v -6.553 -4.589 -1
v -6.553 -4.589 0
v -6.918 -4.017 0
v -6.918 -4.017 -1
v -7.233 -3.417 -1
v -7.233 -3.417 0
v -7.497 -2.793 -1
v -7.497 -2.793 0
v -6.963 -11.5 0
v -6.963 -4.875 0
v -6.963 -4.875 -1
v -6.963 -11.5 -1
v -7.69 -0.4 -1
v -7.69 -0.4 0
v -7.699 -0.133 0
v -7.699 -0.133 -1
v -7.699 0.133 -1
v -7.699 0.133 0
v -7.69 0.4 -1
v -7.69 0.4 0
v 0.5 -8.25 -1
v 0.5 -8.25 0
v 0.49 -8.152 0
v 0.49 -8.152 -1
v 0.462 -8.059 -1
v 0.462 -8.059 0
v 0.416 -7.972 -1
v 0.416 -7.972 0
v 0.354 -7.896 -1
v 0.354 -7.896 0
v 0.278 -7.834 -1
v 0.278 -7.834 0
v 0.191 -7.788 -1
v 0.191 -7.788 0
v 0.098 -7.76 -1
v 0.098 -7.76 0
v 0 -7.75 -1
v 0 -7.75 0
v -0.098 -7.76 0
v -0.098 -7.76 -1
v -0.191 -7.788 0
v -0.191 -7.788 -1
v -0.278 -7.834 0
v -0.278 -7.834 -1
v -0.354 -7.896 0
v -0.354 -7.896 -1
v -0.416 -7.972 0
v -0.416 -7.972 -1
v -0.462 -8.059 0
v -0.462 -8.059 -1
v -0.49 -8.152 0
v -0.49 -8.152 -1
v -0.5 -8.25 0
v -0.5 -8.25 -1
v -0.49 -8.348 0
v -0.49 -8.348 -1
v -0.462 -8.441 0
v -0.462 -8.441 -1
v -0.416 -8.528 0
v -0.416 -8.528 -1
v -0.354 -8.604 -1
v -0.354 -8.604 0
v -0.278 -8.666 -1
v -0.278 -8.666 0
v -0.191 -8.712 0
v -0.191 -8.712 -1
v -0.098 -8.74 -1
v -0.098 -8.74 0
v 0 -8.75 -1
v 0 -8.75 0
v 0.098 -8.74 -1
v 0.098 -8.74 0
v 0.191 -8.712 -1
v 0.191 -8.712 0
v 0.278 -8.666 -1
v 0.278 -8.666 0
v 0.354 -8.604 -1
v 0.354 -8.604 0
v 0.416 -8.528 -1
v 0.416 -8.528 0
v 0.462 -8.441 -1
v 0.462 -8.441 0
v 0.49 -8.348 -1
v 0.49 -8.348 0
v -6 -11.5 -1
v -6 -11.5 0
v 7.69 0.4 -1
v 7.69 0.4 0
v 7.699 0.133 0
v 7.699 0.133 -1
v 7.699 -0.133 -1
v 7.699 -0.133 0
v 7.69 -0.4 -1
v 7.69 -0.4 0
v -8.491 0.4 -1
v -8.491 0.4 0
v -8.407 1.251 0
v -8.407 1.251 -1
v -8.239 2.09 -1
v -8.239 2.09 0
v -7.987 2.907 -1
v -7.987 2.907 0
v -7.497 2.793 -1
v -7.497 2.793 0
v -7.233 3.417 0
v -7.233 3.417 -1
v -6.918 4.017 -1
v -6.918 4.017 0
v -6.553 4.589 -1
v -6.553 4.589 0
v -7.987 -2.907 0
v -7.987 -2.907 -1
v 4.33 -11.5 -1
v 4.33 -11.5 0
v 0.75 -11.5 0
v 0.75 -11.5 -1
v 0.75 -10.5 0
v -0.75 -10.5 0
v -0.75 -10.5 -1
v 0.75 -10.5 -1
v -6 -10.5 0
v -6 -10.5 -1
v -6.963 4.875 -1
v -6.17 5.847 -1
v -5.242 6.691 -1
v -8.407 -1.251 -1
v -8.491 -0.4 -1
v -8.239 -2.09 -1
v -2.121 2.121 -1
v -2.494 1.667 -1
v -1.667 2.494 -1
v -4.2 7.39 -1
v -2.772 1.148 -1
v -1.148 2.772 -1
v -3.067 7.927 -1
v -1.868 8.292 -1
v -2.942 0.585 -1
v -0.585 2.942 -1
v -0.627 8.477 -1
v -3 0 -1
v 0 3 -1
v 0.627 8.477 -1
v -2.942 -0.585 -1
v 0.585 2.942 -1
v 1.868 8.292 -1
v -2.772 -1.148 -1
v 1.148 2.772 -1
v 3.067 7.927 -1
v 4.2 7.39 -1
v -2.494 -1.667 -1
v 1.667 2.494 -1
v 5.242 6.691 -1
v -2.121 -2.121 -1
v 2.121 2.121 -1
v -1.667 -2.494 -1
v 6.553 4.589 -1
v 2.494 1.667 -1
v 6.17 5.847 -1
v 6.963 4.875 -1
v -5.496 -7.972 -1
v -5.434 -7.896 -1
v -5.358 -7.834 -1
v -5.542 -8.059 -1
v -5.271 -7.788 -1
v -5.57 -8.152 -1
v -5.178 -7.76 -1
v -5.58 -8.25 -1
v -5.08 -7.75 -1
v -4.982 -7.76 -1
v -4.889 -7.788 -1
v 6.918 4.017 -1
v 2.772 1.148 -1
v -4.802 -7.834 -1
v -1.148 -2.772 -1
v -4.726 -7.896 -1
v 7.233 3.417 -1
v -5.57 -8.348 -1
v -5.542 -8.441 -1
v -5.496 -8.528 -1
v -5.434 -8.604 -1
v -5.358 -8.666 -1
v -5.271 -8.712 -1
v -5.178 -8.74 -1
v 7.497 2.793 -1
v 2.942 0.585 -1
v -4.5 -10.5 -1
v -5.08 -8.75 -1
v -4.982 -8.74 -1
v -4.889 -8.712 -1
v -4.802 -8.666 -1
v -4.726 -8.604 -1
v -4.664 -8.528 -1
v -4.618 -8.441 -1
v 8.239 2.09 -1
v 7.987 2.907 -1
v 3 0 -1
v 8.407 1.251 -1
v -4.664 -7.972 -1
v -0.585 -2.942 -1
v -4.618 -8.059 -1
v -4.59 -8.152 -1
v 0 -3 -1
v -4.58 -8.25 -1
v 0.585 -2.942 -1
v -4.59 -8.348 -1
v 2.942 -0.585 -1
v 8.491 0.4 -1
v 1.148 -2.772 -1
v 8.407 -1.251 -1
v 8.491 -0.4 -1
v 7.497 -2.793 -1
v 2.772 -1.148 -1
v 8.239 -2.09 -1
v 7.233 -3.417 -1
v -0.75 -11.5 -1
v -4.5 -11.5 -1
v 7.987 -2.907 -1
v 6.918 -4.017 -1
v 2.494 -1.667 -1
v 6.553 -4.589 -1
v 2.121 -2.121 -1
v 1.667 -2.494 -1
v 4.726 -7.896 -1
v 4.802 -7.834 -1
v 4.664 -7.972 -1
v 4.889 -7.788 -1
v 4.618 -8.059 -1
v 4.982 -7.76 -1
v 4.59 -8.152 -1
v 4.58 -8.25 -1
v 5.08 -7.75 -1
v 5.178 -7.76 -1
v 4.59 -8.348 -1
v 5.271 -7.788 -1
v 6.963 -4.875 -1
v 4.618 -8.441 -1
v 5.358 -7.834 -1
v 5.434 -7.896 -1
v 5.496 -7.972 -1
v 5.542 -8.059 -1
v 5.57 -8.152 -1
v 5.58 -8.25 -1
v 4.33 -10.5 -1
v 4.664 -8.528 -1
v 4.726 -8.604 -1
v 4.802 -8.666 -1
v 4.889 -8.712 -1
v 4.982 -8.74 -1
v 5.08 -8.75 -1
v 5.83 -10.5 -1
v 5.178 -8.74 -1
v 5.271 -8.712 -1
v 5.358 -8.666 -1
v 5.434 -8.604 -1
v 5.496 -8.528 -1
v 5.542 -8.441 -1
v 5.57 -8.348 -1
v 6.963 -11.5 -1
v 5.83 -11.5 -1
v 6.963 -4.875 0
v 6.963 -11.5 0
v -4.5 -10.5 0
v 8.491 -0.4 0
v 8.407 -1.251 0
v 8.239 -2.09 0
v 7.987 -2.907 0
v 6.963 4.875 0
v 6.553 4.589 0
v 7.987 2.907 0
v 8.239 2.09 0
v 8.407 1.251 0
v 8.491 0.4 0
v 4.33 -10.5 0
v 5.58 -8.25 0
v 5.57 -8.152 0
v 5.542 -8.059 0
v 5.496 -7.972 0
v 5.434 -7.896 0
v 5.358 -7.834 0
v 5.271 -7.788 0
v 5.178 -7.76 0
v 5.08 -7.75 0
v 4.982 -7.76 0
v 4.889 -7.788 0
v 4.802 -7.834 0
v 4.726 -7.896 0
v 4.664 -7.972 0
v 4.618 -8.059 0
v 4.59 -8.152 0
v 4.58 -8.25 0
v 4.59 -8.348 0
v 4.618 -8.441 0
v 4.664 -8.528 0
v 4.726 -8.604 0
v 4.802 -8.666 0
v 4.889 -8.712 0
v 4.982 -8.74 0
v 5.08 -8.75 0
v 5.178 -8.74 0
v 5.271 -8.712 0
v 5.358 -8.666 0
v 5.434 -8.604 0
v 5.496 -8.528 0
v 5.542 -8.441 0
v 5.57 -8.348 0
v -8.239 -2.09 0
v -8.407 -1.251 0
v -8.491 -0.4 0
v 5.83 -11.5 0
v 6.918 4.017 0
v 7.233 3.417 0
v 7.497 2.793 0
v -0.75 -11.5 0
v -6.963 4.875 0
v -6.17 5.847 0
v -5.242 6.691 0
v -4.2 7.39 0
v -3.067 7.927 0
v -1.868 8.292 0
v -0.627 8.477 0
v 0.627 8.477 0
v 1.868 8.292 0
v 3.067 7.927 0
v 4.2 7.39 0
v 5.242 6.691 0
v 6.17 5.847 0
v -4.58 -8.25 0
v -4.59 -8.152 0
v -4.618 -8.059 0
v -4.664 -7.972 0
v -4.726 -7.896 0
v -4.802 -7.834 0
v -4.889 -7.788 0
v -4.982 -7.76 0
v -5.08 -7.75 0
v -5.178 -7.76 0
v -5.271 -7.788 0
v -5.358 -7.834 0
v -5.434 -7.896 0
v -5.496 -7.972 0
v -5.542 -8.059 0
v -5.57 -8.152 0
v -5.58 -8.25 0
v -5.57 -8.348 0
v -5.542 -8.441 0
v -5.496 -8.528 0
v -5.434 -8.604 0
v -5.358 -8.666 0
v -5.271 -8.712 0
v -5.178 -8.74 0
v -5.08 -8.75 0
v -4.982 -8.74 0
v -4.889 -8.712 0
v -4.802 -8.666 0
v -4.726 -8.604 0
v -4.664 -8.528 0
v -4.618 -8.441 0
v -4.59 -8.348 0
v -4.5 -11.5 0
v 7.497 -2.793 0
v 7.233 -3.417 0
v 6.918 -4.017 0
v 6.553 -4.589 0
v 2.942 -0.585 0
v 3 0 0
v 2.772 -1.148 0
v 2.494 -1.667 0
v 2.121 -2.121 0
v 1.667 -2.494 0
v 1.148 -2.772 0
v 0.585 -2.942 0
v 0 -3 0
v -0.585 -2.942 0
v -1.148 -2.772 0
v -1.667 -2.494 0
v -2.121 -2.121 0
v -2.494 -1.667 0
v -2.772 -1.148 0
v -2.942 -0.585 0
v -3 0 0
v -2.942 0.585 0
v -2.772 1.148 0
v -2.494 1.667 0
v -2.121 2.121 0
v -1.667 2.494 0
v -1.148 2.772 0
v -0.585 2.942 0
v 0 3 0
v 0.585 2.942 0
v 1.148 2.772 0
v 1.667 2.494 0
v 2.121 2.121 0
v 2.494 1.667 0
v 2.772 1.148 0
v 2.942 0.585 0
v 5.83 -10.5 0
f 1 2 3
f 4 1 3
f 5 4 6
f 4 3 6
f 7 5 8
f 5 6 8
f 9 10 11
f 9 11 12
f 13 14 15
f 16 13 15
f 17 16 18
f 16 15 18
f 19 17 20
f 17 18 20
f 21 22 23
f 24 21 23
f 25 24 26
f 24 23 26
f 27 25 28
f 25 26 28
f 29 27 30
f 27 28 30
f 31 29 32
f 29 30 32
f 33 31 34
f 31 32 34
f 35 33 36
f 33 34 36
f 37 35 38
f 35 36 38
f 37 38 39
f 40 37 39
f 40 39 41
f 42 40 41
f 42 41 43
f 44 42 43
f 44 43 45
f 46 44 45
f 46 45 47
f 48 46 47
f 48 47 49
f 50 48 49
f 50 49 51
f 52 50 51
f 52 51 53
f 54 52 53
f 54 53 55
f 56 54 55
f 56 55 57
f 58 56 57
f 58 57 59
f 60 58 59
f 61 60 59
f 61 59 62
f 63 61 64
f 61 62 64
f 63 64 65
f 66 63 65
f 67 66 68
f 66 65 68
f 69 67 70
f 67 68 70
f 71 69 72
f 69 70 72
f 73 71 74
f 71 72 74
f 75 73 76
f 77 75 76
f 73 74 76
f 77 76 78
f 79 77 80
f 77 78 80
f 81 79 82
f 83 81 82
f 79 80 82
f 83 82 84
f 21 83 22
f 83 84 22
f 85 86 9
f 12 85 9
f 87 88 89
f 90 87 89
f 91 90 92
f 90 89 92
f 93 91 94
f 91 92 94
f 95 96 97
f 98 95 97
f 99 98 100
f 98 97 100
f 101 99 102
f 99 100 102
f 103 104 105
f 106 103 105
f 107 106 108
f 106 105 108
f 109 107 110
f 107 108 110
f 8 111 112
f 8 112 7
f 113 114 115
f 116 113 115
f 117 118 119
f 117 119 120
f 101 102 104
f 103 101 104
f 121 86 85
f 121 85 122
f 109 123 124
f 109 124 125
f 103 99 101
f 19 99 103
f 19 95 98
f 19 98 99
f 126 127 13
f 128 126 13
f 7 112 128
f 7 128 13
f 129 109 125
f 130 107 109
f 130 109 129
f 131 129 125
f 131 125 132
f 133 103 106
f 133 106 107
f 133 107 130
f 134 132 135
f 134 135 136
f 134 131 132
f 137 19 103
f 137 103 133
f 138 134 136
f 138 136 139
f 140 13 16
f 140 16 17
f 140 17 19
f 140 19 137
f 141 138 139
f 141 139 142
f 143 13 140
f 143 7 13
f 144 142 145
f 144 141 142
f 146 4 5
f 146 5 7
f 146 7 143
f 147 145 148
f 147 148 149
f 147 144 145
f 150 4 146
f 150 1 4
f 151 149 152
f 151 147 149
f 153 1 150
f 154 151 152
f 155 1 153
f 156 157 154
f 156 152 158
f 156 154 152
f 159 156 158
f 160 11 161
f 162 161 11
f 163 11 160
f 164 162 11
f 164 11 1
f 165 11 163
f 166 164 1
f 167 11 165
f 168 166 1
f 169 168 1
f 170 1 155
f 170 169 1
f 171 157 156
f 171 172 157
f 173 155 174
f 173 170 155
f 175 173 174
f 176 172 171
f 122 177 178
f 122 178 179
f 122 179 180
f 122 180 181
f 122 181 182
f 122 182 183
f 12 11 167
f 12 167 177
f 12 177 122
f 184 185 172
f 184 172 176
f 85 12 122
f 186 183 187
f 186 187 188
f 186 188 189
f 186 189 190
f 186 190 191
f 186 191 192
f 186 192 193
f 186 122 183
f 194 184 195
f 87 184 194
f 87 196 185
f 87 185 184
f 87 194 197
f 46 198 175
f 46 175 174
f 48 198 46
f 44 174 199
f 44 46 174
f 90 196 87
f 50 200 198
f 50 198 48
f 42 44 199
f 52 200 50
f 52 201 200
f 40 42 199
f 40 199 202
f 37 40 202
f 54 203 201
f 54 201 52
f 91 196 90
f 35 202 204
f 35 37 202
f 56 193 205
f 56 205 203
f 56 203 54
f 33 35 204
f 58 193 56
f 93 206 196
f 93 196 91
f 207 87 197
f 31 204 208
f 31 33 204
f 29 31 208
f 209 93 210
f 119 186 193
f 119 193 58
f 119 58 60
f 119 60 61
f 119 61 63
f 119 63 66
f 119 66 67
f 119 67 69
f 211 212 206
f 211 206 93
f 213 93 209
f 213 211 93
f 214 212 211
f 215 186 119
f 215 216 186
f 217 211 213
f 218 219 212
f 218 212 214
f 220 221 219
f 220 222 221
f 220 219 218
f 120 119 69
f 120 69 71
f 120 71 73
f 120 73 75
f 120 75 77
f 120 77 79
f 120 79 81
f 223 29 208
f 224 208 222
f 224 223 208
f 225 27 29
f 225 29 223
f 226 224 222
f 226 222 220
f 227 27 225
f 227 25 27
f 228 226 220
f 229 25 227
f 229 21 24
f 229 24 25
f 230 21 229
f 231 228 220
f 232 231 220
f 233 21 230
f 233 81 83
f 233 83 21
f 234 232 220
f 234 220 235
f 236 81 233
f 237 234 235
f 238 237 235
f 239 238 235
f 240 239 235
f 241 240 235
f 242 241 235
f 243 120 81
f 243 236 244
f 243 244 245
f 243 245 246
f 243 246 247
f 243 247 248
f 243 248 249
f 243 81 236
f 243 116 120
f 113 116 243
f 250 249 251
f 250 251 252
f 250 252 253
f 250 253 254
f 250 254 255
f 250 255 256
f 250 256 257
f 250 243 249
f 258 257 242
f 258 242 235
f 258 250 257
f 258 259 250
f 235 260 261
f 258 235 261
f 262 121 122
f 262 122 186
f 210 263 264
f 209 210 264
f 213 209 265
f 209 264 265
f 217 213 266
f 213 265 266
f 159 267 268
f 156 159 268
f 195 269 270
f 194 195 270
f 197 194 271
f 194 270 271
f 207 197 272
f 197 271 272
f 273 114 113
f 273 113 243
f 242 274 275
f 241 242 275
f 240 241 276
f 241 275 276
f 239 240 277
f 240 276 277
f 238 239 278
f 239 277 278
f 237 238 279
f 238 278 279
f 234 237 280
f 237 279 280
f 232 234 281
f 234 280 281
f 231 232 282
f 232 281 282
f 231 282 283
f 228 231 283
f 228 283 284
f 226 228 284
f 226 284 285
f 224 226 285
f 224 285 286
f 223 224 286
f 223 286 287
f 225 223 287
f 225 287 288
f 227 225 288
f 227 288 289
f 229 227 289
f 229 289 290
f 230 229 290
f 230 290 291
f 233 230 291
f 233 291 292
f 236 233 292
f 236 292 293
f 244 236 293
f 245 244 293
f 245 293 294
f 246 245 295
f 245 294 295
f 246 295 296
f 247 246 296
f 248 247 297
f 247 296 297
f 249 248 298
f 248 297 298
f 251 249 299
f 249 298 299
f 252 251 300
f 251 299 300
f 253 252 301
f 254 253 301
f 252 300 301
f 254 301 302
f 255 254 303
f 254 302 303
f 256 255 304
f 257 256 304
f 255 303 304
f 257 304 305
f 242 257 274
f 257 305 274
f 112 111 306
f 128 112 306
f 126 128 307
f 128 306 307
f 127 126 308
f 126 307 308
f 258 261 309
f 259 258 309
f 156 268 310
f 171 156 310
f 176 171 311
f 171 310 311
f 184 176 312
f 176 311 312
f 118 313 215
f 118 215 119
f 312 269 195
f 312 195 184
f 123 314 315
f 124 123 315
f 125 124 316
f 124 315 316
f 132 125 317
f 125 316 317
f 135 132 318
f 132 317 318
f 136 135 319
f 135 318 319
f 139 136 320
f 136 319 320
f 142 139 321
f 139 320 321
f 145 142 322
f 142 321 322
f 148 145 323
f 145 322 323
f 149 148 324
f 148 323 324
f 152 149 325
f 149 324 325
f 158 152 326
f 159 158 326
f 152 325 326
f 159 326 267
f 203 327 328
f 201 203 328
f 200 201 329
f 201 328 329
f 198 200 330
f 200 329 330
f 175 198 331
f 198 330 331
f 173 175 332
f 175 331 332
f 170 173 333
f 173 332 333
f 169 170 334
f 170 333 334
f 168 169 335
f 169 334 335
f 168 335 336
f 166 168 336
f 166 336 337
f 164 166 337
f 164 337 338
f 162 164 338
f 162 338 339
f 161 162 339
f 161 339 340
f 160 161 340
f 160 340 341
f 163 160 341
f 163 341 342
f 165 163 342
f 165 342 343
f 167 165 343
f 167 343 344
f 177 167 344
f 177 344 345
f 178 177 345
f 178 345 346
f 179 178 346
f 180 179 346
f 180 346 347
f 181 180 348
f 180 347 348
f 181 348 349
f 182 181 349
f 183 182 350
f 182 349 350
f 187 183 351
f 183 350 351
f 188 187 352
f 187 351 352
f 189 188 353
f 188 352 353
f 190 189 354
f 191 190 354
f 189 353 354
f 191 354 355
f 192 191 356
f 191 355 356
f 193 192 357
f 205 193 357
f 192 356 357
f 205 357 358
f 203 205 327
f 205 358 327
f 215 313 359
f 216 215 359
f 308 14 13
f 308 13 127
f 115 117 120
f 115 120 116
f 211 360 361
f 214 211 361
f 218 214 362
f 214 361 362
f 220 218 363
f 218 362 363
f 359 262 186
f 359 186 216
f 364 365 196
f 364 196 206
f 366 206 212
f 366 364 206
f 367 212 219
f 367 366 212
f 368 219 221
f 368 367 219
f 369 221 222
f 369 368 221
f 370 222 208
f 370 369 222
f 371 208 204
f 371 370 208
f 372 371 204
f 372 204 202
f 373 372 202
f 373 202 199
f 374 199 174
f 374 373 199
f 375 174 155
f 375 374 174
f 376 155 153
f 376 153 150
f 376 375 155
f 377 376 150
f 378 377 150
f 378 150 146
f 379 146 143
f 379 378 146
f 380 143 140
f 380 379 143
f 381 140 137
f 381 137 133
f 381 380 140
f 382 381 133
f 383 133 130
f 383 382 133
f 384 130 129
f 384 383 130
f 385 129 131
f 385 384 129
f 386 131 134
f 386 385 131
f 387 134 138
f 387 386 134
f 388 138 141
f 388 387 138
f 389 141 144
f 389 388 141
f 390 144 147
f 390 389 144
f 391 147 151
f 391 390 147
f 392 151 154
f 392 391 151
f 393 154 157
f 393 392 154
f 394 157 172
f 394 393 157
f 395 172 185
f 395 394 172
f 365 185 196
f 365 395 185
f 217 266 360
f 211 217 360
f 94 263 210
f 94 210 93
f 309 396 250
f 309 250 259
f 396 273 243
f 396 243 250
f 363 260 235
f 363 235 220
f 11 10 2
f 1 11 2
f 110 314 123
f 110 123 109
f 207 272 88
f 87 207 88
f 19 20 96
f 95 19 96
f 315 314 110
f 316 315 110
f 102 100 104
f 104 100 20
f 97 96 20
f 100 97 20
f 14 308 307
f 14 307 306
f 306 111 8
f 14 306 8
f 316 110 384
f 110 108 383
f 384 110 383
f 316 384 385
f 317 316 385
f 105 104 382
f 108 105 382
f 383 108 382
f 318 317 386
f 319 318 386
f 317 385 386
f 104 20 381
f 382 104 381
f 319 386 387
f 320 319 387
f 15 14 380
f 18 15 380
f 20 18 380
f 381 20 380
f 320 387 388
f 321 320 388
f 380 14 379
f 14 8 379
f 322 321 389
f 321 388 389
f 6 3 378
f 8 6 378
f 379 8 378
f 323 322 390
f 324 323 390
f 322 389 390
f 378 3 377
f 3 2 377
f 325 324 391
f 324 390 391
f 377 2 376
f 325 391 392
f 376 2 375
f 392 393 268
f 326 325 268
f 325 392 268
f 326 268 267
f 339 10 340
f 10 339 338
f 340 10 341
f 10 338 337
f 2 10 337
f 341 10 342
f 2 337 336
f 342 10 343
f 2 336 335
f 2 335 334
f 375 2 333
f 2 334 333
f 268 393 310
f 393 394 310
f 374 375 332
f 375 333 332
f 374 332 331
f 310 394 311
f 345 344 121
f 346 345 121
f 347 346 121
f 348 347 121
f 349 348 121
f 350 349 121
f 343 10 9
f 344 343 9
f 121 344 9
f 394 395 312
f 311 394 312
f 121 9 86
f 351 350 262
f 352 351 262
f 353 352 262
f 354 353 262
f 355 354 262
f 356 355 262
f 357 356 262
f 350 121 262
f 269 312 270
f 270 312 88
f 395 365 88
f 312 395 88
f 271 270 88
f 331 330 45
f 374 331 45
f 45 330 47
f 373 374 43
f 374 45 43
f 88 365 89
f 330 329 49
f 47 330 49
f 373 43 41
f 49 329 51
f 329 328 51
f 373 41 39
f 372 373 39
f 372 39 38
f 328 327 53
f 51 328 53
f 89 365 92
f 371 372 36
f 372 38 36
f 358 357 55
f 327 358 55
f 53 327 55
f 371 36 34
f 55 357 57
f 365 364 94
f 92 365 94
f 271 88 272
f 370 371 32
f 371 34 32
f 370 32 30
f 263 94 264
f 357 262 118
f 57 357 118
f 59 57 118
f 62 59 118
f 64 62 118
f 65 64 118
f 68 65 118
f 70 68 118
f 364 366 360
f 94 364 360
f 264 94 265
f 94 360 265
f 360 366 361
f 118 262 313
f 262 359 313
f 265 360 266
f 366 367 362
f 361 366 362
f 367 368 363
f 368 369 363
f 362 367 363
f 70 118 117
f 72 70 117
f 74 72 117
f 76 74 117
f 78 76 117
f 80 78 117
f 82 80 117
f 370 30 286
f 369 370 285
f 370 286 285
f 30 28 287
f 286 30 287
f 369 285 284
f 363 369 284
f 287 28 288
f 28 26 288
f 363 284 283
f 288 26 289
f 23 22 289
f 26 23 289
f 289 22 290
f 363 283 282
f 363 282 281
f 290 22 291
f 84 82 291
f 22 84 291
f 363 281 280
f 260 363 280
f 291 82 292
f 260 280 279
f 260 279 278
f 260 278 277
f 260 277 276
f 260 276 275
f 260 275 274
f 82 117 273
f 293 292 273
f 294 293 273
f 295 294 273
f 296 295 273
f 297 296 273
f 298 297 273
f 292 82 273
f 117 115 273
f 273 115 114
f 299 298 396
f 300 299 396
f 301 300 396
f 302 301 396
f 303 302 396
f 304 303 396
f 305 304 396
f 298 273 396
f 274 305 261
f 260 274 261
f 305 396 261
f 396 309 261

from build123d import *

# Parameters (mm, degrees)
SKETCH006_R     = 3
PAD005_DEPTH    = 1
SKETCH016_R     = 0.5
POCKET004_DEPTH = 2
POCKET005_DEPTH = 5


with BuildPart() as part:
    # Sketch006 (on ShapeBinder) → Pad005 (new body)
    with BuildSketch(Plane(origin=(0, 0, 0), x_dir=(1, 0, 0), z_dir=(0, 0, -1))):
        with BuildLine():
            ThreePointArc((-7.987387, 2.907171), (-8.333808, 1.672617), (-8.490583, 0.4))
            Line((-7.689603, 0.4), (-8.490583, 0.4))
            ThreePointArc((-7.689603, 0.4), (-7.7, 0), (-7.689603, -0.4))
            Line((-7.689603, -0.4), (-8.490583, -0.4))
            ThreePointArc((-8.490583, -0.4), (-8.333808, -1.672617), (-7.987387, -2.907171))
            Line((-7.987387, -2.907171), (-7.496671, -2.792834))
            ThreePointArc((-7.496671, -2.792834), (-7.082093, -3.720747), (-6.553216, -4.588611))
            Line((-6.962792, -4.8754), (-6.553216, -4.588611))
            ThreePointArc((-6.962792, -4.8754), (0, -8.5), (6.962792, -4.8754))
            Line((6.962792, -4.8754), (6.553216, -4.588611))
            ThreePointArc((6.553216, -4.588611), (7.082093, -3.720747), (7.496671, -2.792834))
            Line((7.987387, -2.907171), (7.496671, -2.792834))
            ThreePointArc((7.987387, -2.907171), (8.333808, -1.672617), (8.490583, -0.4))
            Line((8.490583, -0.4), (7.689603, -0.4))
            ThreePointArc((7.689603, -0.4), (7.7, 0), (7.689603, 0.4))
            Line((8.490583, 0.4), (7.689603, 0.4))
            ThreePointArc((8.490583, 0.4), (8.333808, 1.672617), (7.987387, 2.907171))
            Line((7.987387, 2.907171), (7.496671, 2.792834))
            ThreePointArc((7.496671, 2.792834), (7.082093, 3.720747), (6.553216, 4.588611))
            Line((6.962792, 4.8754), (6.553216, 4.588611))
            Line((6.962792, 4.8754), (6.962792, 11.5))
            Line((6.962792, 11.5), (-6.962792, 11.5))
            Line((-6.962792, 4.8754), (-6.962792, 11.5))
            Line((-6.962792, 4.8754), (-6.553216, 4.588611))
            ThreePointArc((-6.553216, 4.588611), (-7.082093, 3.720747), (-7.496671, 2.792834))
            Line((-7.987387, 2.907171), (-7.496671, 2.792834))
        make_face()
        Circle(SKETCH006_R, mode=Mode.SUBTRACT)
    extrude(amount=PAD005_DEPTH)

    # Sketch016 (on Face28 of Pad005) → Pocket004 (cut)
    with BuildSketch(Plane.XY):
        with Locations((0, -8.25)):
            Circle(SKETCH016_R)
        with Locations((-5.08, -8.25)):
            Circle(SKETCH016_R)
        with Locations((5.08, -8.25)):
            Circle(SKETCH016_R)
    extrude(amount=-POCKET004_DEPTH, mode=Mode.SUBTRACT)

    # Sketch017 (on Face4 of Pocket004) → Pocket005 (cut)
    with BuildSketch(Plane.XY):
        Polygon((-6.962792, -11.5), (-6, -11.5), (-6, -10.5), (-4.5, -10.5), (-4.5, -11.5), (-0.75, -11.5), (-0.75, -10.5), (0.75, -10.5), (0.75, -11.5), (4.33, -11.5), (4.33, -10.5), (5.83, -10.5), (5.83, -11.5), (6.962792, -11.5), (6.962792, -12.871278), (-6.962792, -12.871278), align=None)
    extrude(amount=-POCKET005_DEPTH, mode=Mode.SUBTRACT)


solid = part.part
